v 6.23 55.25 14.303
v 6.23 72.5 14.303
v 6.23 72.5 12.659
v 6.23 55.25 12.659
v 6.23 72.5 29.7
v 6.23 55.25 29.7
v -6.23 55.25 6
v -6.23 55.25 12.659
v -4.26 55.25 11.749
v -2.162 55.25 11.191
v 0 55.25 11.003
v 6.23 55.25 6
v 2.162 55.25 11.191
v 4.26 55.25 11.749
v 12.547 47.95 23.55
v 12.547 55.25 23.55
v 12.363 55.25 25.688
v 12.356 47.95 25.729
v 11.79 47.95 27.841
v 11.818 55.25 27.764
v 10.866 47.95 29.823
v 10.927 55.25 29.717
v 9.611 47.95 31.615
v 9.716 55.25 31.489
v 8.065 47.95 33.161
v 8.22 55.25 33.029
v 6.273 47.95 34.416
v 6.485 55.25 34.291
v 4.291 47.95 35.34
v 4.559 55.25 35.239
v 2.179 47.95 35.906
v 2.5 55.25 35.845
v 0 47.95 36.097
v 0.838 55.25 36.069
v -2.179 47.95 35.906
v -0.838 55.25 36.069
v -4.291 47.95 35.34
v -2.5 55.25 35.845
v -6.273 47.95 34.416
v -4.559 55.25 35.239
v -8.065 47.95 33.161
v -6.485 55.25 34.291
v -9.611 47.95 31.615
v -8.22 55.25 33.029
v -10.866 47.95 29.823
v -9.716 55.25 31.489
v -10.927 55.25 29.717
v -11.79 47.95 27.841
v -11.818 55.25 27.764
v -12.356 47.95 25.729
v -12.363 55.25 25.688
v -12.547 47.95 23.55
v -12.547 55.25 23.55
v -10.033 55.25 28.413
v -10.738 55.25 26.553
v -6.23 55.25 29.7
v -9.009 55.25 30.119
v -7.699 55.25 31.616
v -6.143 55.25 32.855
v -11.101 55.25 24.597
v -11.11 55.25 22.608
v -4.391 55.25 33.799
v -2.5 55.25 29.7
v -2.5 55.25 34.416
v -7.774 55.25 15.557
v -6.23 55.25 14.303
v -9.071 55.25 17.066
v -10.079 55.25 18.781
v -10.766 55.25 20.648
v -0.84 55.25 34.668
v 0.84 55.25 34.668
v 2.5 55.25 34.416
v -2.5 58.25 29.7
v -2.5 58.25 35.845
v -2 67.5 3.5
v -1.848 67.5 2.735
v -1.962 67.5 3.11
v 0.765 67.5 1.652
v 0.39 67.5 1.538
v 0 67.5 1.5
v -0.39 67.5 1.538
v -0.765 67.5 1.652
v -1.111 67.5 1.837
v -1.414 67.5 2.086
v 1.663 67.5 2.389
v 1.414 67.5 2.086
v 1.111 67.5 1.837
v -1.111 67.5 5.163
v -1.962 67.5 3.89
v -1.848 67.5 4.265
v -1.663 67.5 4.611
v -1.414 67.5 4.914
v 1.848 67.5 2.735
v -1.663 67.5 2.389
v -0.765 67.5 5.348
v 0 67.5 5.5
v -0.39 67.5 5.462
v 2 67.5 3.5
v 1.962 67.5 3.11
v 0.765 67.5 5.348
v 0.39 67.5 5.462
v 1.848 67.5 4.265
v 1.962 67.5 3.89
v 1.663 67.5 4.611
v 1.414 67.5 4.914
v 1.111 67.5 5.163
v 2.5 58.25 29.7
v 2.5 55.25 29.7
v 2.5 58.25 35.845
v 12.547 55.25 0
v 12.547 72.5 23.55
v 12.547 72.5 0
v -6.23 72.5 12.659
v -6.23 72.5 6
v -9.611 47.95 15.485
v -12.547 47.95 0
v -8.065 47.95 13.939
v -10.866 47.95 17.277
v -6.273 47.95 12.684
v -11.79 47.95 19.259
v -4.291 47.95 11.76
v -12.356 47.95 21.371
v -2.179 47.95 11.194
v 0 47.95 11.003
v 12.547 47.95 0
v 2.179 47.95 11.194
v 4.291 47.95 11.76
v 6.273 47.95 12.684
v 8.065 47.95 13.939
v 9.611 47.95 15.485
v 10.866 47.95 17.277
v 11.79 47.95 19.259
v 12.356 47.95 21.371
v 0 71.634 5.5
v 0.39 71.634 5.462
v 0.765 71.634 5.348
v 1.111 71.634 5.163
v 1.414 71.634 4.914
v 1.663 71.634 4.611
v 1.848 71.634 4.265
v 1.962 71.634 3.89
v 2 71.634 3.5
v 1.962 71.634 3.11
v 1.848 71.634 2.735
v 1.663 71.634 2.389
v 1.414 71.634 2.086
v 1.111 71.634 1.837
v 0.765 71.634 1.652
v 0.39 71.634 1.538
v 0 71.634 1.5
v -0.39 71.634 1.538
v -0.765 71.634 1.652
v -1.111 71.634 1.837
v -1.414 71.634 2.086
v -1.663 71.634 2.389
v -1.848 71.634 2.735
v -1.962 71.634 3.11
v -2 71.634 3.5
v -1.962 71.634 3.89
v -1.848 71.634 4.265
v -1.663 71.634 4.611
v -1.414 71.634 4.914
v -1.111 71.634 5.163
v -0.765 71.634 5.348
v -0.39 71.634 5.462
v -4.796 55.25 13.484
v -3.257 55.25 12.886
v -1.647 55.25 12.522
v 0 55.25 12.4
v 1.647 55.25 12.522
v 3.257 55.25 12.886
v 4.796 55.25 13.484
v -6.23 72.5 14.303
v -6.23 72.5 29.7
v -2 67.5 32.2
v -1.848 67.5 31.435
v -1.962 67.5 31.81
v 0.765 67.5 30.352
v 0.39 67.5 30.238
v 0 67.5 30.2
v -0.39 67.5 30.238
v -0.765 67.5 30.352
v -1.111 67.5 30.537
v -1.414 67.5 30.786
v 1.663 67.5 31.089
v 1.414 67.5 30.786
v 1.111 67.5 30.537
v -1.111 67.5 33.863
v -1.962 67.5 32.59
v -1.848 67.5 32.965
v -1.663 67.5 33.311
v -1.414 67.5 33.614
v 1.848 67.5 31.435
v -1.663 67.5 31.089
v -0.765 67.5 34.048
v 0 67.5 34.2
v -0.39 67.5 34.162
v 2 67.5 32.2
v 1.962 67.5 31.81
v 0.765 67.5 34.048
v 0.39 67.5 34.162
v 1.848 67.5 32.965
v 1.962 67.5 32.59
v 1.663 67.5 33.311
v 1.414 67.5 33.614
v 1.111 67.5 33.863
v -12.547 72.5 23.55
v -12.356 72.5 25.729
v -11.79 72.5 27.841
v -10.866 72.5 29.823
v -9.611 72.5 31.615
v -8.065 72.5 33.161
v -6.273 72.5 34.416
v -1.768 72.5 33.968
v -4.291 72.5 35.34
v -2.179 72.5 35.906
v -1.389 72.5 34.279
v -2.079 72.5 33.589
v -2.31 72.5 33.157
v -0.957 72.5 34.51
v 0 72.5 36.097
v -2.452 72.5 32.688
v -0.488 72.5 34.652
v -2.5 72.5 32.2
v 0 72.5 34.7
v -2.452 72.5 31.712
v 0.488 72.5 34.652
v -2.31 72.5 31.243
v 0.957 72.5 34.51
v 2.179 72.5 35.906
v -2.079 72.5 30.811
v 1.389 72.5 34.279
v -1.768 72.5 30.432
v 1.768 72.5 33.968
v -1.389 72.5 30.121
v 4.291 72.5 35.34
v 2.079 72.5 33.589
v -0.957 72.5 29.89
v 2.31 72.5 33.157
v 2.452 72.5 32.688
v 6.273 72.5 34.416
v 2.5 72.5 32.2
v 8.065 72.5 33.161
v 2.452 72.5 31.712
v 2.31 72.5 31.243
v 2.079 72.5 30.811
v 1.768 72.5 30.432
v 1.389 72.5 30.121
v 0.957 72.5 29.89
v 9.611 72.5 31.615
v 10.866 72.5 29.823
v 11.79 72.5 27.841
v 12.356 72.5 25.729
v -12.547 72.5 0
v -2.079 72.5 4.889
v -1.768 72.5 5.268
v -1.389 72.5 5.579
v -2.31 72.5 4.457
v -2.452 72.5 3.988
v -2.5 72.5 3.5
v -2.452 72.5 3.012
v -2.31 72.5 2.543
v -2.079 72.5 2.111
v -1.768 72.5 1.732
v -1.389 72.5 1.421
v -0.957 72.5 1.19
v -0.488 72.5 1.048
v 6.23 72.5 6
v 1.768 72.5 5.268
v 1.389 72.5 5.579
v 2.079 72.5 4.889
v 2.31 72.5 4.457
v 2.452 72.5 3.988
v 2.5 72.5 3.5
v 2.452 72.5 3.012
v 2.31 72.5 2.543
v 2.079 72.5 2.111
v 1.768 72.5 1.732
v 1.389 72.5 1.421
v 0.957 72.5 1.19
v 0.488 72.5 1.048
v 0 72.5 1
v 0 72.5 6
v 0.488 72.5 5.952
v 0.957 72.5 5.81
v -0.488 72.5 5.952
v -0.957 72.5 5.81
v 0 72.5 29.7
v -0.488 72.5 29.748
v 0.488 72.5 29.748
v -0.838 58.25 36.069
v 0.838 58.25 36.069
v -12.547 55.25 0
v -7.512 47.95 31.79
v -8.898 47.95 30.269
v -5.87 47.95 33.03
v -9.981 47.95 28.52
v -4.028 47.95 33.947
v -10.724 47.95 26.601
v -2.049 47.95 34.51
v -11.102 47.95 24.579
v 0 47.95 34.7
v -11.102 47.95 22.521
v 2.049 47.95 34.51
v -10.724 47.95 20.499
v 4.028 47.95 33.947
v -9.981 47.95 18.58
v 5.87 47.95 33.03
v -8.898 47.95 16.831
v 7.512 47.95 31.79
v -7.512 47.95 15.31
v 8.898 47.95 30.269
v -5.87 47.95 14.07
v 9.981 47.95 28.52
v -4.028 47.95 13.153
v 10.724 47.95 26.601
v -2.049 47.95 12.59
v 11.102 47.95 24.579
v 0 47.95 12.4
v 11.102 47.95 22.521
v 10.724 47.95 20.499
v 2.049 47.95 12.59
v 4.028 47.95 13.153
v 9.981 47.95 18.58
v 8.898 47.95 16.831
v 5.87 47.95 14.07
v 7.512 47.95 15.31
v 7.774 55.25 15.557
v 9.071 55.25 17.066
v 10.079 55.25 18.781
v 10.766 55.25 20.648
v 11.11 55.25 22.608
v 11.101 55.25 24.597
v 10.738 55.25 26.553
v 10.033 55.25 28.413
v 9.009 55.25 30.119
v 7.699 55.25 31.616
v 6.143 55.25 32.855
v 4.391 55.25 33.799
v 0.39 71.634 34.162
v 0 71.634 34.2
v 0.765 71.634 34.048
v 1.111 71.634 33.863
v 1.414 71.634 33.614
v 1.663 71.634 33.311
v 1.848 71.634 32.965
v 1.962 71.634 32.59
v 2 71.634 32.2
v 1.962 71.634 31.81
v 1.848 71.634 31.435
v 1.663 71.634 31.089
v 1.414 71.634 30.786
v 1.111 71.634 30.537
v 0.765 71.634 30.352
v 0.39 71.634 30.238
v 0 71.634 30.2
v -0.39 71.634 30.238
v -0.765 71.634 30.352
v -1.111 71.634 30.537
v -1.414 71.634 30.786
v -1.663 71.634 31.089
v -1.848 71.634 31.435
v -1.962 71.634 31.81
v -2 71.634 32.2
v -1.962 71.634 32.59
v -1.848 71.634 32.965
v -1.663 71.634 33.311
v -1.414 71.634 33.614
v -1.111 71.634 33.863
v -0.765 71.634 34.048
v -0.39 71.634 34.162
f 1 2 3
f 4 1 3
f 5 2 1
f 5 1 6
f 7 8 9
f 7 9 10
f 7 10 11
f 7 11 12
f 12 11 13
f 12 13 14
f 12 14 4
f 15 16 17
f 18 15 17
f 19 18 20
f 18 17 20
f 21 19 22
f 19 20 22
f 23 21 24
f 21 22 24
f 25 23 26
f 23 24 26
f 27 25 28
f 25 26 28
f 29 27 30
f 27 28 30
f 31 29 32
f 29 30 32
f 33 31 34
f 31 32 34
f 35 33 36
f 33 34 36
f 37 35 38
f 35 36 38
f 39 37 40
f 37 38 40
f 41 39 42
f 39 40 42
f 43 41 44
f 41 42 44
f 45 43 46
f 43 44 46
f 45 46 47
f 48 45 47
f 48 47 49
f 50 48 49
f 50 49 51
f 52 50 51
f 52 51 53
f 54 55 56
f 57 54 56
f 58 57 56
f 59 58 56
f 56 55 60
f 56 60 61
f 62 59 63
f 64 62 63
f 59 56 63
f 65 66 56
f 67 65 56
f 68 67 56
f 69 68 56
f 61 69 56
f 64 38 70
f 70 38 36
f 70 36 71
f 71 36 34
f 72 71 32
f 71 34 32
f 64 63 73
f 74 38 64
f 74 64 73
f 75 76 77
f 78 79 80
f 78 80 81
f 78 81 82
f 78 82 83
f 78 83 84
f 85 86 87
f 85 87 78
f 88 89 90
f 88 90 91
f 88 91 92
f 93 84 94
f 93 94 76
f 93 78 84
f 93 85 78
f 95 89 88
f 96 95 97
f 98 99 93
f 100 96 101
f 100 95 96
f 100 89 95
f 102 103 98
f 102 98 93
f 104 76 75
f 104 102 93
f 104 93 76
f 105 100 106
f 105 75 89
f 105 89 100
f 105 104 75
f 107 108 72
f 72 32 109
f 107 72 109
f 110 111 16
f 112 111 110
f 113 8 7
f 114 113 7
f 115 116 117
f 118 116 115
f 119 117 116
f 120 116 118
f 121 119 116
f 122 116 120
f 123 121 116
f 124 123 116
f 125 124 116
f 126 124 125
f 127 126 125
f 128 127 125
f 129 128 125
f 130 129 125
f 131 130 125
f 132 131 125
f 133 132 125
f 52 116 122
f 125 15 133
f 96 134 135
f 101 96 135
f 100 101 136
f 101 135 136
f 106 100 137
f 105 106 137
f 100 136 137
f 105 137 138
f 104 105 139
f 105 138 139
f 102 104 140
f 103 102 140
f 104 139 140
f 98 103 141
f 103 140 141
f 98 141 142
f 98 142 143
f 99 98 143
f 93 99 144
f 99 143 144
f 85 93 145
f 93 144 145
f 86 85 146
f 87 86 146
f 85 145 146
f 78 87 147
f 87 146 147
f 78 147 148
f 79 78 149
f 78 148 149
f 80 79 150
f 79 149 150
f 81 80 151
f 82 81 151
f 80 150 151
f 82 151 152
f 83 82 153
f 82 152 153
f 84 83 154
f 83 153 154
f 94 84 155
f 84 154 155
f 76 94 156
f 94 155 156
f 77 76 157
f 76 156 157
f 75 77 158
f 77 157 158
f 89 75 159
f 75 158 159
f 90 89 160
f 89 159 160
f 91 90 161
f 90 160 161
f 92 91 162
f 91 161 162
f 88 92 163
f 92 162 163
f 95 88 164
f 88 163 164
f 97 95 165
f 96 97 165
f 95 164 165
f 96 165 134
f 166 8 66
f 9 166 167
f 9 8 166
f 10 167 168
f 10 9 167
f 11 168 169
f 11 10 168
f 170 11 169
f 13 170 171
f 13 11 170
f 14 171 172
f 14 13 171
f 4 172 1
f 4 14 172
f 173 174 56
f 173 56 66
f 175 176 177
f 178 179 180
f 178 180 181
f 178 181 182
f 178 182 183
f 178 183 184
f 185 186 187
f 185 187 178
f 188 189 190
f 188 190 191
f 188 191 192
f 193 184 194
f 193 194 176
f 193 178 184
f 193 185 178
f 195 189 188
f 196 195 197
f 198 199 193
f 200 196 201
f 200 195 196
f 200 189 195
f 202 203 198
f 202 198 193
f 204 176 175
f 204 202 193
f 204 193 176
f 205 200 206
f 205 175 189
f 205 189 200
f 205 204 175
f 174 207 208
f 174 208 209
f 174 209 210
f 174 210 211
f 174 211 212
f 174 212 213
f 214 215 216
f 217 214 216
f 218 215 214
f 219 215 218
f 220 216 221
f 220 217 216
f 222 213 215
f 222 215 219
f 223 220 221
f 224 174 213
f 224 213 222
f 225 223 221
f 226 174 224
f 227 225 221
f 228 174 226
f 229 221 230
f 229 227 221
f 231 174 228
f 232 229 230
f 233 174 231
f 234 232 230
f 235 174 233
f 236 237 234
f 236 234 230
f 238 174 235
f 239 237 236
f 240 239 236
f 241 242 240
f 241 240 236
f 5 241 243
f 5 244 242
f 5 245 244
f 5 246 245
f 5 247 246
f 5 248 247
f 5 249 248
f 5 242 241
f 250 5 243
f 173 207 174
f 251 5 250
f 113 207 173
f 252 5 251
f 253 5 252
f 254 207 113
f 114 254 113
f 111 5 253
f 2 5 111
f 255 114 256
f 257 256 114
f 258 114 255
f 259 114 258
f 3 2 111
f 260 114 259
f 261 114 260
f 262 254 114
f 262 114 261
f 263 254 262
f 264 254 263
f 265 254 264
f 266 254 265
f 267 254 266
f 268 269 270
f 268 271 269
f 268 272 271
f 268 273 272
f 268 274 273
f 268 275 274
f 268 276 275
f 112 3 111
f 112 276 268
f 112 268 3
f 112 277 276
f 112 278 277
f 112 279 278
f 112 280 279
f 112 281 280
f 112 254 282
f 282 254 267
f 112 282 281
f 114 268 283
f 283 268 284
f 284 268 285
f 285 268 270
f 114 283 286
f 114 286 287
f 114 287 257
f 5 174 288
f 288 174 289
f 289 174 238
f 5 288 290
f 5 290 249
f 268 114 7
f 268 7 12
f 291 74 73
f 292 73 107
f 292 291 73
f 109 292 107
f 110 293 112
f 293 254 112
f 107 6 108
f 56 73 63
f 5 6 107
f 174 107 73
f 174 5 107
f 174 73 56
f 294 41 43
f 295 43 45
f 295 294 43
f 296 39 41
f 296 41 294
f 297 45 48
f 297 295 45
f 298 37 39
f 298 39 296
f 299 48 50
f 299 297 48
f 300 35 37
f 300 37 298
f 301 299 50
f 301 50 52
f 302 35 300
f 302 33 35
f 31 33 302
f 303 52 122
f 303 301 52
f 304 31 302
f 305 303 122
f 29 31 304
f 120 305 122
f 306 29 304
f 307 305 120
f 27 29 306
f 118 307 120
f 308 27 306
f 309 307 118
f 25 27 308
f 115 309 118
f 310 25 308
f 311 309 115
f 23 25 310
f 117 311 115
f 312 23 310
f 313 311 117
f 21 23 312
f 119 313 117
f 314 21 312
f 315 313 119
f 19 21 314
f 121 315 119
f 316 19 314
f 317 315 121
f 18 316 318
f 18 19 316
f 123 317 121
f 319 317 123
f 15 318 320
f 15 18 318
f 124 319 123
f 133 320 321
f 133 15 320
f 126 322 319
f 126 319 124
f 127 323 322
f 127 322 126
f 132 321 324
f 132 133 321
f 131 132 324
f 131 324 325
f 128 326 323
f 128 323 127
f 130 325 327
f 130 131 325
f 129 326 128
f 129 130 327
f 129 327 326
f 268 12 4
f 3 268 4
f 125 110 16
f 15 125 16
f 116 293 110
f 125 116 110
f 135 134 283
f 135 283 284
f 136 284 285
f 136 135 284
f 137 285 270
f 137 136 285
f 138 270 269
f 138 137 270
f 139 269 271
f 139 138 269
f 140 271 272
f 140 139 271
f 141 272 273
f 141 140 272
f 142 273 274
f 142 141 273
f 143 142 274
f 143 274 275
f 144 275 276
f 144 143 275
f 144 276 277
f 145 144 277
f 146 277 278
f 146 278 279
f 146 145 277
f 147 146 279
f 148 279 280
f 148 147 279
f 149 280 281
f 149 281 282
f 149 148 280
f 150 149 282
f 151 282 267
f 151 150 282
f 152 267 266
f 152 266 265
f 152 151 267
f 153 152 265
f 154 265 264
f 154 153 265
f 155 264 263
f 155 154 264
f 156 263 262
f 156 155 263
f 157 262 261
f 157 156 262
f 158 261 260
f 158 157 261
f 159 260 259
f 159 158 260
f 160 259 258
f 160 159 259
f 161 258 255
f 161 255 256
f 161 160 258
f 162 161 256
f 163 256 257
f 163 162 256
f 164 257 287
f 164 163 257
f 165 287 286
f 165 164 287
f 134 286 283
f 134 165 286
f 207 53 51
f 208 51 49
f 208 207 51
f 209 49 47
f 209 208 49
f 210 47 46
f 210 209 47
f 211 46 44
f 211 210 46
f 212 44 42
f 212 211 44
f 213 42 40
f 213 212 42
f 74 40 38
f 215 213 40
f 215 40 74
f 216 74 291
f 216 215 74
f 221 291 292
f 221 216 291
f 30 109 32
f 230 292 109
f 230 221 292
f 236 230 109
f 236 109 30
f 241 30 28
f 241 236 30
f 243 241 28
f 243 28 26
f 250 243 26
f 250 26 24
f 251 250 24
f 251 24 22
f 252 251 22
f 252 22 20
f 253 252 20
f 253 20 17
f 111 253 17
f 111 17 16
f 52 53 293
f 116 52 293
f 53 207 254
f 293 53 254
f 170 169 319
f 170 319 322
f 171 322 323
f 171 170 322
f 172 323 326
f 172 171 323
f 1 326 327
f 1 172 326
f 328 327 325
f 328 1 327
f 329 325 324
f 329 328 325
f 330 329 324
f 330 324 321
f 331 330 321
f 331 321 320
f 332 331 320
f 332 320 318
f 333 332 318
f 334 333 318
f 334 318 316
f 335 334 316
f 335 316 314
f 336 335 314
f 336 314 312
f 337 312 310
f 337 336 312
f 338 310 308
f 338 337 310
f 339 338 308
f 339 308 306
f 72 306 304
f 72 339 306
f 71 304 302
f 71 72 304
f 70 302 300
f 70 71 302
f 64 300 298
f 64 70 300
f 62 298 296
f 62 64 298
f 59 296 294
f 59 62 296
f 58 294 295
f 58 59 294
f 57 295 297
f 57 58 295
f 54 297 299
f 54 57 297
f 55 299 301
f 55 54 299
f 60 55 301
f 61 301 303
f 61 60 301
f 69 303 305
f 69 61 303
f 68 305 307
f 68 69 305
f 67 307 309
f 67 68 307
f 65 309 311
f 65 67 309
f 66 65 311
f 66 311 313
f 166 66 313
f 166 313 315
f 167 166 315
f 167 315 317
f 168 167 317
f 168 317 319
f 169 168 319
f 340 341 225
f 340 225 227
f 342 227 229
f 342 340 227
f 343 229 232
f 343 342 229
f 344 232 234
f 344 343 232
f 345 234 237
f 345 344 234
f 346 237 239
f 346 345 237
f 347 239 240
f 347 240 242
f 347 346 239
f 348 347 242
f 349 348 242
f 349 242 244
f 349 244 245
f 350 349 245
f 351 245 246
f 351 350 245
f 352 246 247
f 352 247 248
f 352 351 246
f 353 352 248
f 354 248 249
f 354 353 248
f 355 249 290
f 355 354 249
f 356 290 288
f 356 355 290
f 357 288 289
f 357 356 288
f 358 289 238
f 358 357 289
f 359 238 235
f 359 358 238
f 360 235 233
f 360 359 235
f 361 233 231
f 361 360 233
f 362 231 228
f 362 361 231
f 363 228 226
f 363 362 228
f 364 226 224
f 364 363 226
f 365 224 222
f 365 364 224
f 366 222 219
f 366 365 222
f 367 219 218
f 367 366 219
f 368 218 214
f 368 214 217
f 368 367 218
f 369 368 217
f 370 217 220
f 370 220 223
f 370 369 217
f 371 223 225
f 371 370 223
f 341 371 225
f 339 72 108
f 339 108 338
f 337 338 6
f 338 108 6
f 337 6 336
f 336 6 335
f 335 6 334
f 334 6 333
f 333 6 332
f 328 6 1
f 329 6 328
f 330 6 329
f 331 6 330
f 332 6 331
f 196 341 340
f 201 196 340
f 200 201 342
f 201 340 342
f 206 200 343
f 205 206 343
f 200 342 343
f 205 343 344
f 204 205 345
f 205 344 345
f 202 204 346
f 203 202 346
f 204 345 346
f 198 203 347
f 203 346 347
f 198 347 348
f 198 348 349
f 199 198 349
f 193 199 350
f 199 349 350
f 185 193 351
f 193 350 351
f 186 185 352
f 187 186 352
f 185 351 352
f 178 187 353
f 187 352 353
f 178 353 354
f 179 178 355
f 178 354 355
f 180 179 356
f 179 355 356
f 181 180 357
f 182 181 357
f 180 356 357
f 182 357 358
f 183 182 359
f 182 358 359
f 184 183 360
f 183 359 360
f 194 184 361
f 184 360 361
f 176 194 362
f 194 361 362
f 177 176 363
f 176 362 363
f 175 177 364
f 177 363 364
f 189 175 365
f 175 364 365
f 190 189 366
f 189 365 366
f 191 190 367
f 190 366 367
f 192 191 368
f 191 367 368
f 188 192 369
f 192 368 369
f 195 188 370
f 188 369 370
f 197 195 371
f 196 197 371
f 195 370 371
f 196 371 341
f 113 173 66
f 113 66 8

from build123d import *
from OCP.BRepFilletAPI import BRepFilletAPI_MakeChamfer

# Parameters (mm, degrees)
SKETCH4_W                = 12.46
SKETCH4_H                = 17.25
BOSS_EXTRUDE3_DEPTH      = 6
BOSS_EXTRUDE6_DEPTH      = 7.3
BOSS_EXTRUDE6_DEPTH_BACK = 17.25
SKETCH8_R                = 12.546781182
SKETCH8_R_2              = 11.15
BOSS_EXTRUDE4_DEPTH      = 17.25
SKETCH6_R                = 2
CUT_EXTRUDE1_DEPTH       = 5
CHAMFER1_SIZE            = 0.5
CHAMFER1_SIZE_2          = 0.866025404
SKETCH10_W               = 12.46
SKETCH10_H               = 23.7
CUT_EXTRUDE3_DEPTH       = 17.25
CUT_EXTRUDE4_REACH       = 83.955
SKETCH11_W               = 5
SKETCH11_H               = 3
BOSS_EXTRUDE7_START      = -7.3
BOSS_EXTRUDE7_DEPTH      = 7.3


with BuildPart() as part:
    # Sketch4 → Boss-Extrude3 (new body)
    with BuildSketch(Plane.XY):
        with Locations((0, 63.875025481)):
            Rectangle(SKETCH4_W, SKETCH4_H)
    extrude(amount=BOSS_EXTRUDE3_DEPTH)



with BuildPart() as body_2:
    # Sketch8 → Boss-Extrude6 (new, two sides: drawn at the far end of the back side and taken through both)
    with BuildSketch(Plane(origin=(0, 55.250025481, 0), x_dir=(-1, 0, 0), z_dir=(0, -1, 0)).offset(-BOSS_EXTRUDE6_DEPTH_BACK)):
        with Locations(Location((0, -23.55, 0), (0, 0, 90))):
            Circle(SKETCH8_R)
        with Locations(Location((0, -23.55, 0), (0, 0, 90))):
            Circle(SKETCH8_R_2, mode=Mode.SUBTRACT)
    extrude(amount=BOSS_EXTRUDE6_DEPTH + BOSS_EXTRUDE6_DEPTH_BACK)


with BuildPart() as part_1:
    add(part.part)

    add(body_2.part)  # Boss-Extrude4 merges body 2
    # Sketch5 → Boss-Extrude4 (add)
    with BuildSketch(Plane(origin=(0, 72.500025481, 0), x_dir=(1, 0, 0), z_dir=(0, 1, 0))):
        with BuildLine():
            Line((12.546781182, -23.55), (12.546781182, 0))
            Line((12.546781182, 0), (6.23, 0))
            Line((6.23, 0), (6.23, -29.7))
            Line((6.23, -29.7), (-6.23, -29.7))
            Line((-6.23, -29.7), (-6.23, 0))
            Line((-6.23, 0), (-12.546781182, 0))
            Line((-12.546781182, 0), (-12.546781182, -23.55))
            ThreePointArc((-12.546781182, -23.55), (0, -36.096781182), (12.546781182, -23.55))
        make_face()
    extrude(amount=-BOSS_EXTRUDE4_DEPTH)

    # Sketch6 → Cut-Extrude1 (cut)
    with BuildSketch(Plane(origin=(0, 72.500025481, 0), x_dir=(1, 0, 0), z_dir=(0, 1, 0))):
        with Locations(Location((0, -3.5, 0), (0, 0, 270))):
            Circle(SKETCH6_R)
        with Locations(Location((0, -32.2, 0), (0, 0, 270))):
            Circle(SKETCH6_R)
    extrude(amount=-CUT_EXTRUDE1_DEPTH, mode=Mode.SUBTRACT)

    # Chamfer1
    chamfer1_edges_1 = [part_1.edges().sort_by_distance(p)[0] for p in [
        (0, 72.500025481, 1.5),
    ]]
    chamfer1_side_1 = [part_1.faces().sort_by_distance(p)[0] for p in [
        (0, 72.500025481, 1.49),
    ]]
    chamfer1_edges_2 = [part_1.edges().sort_by_distance(p)[0] for p in [
        (0, 72.500025481, 30.2),
    ]]
    chamfer1_side_2 = [part_1.faces().sort_by_distance(p)[0] for p in [
        (0, 72.500025481, 30.19),
    ]]
    chamfer1 = BRepFilletAPI_MakeChamfer(part_1.part.solid().wrapped)
    for e in chamfer1_edges_1:
        chamfer1.Add(CHAMFER1_SIZE - 0.0001, CHAMFER1_SIZE_2 - 0.0001, e.wrapped, chamfer1_side_1[0].wrapped)
    for e in chamfer1_edges_2:
        chamfer1.Add(CHAMFER1_SIZE - 0.0001, CHAMFER1_SIZE_2 - 0.0001, e.wrapped, chamfer1_side_2[0].wrapped)
    add(Compound.cast(chamfer1.Shape()), mode=Mode.REPLACE)  # a hair under: the kernel refuses the full size

    # Sketch10 → Cut-Extrude3 (cut)
    with BuildSketch(Plane(origin=(0, 72.500025481, 0), x_dir=(1, 0, 0), z_dir=(0, 1, 0))):
        with Locations((0, -17.85)):
            Rectangle(SKETCH10_W, SKETCH10_H)
    extrude(amount=-CUT_EXTRUDE3_DEPTH, mode=Mode.SUBTRACT)

    # Sketch11 → Cut-Extrude4 (cut, up to next)
    with BuildSketch(Plane.XY.offset(36.096781182), mode=Mode.PRIVATE) as cut_extrude4_sk1:
        with Locations((0, 56.750025481)):
            Rectangle(SKETCH11_W, SKETCH11_H)
    cut_extrude4_tool1 = extrude(cut_extrude4_sk1.sketch, amount=-CUT_EXTRUDE4_REACH, mode=Mode.PRIVATE) & part_1.part
    add(cut_extrude4_tool1.solids().sort_by_distance((0, 56.750025, 36.096781))[0], mode=Mode.SUBTRACT)

    # Sketch13 → Boss-Extrude7 (add)
    with BuildSketch(Plane.XZ.offset(-47.950025481).offset(BOSS_EXTRUDE7_START)):
        with BuildLine():
            Line((-12.546781182, 23.55), (-12.546781182, 0))
            Line((-12.546781182, 0), (12.546781182, 0))
            Line((12.546781182, 0), (12.546781182, 23.55))
            ThreePointArc((12.546781182, 23.55), (0, 11.003218818), (-12.546781182, 23.55))
        make_face()
    extrude(amount=BOSS_EXTRUDE7_DEPTH)


solid = part_1.part
